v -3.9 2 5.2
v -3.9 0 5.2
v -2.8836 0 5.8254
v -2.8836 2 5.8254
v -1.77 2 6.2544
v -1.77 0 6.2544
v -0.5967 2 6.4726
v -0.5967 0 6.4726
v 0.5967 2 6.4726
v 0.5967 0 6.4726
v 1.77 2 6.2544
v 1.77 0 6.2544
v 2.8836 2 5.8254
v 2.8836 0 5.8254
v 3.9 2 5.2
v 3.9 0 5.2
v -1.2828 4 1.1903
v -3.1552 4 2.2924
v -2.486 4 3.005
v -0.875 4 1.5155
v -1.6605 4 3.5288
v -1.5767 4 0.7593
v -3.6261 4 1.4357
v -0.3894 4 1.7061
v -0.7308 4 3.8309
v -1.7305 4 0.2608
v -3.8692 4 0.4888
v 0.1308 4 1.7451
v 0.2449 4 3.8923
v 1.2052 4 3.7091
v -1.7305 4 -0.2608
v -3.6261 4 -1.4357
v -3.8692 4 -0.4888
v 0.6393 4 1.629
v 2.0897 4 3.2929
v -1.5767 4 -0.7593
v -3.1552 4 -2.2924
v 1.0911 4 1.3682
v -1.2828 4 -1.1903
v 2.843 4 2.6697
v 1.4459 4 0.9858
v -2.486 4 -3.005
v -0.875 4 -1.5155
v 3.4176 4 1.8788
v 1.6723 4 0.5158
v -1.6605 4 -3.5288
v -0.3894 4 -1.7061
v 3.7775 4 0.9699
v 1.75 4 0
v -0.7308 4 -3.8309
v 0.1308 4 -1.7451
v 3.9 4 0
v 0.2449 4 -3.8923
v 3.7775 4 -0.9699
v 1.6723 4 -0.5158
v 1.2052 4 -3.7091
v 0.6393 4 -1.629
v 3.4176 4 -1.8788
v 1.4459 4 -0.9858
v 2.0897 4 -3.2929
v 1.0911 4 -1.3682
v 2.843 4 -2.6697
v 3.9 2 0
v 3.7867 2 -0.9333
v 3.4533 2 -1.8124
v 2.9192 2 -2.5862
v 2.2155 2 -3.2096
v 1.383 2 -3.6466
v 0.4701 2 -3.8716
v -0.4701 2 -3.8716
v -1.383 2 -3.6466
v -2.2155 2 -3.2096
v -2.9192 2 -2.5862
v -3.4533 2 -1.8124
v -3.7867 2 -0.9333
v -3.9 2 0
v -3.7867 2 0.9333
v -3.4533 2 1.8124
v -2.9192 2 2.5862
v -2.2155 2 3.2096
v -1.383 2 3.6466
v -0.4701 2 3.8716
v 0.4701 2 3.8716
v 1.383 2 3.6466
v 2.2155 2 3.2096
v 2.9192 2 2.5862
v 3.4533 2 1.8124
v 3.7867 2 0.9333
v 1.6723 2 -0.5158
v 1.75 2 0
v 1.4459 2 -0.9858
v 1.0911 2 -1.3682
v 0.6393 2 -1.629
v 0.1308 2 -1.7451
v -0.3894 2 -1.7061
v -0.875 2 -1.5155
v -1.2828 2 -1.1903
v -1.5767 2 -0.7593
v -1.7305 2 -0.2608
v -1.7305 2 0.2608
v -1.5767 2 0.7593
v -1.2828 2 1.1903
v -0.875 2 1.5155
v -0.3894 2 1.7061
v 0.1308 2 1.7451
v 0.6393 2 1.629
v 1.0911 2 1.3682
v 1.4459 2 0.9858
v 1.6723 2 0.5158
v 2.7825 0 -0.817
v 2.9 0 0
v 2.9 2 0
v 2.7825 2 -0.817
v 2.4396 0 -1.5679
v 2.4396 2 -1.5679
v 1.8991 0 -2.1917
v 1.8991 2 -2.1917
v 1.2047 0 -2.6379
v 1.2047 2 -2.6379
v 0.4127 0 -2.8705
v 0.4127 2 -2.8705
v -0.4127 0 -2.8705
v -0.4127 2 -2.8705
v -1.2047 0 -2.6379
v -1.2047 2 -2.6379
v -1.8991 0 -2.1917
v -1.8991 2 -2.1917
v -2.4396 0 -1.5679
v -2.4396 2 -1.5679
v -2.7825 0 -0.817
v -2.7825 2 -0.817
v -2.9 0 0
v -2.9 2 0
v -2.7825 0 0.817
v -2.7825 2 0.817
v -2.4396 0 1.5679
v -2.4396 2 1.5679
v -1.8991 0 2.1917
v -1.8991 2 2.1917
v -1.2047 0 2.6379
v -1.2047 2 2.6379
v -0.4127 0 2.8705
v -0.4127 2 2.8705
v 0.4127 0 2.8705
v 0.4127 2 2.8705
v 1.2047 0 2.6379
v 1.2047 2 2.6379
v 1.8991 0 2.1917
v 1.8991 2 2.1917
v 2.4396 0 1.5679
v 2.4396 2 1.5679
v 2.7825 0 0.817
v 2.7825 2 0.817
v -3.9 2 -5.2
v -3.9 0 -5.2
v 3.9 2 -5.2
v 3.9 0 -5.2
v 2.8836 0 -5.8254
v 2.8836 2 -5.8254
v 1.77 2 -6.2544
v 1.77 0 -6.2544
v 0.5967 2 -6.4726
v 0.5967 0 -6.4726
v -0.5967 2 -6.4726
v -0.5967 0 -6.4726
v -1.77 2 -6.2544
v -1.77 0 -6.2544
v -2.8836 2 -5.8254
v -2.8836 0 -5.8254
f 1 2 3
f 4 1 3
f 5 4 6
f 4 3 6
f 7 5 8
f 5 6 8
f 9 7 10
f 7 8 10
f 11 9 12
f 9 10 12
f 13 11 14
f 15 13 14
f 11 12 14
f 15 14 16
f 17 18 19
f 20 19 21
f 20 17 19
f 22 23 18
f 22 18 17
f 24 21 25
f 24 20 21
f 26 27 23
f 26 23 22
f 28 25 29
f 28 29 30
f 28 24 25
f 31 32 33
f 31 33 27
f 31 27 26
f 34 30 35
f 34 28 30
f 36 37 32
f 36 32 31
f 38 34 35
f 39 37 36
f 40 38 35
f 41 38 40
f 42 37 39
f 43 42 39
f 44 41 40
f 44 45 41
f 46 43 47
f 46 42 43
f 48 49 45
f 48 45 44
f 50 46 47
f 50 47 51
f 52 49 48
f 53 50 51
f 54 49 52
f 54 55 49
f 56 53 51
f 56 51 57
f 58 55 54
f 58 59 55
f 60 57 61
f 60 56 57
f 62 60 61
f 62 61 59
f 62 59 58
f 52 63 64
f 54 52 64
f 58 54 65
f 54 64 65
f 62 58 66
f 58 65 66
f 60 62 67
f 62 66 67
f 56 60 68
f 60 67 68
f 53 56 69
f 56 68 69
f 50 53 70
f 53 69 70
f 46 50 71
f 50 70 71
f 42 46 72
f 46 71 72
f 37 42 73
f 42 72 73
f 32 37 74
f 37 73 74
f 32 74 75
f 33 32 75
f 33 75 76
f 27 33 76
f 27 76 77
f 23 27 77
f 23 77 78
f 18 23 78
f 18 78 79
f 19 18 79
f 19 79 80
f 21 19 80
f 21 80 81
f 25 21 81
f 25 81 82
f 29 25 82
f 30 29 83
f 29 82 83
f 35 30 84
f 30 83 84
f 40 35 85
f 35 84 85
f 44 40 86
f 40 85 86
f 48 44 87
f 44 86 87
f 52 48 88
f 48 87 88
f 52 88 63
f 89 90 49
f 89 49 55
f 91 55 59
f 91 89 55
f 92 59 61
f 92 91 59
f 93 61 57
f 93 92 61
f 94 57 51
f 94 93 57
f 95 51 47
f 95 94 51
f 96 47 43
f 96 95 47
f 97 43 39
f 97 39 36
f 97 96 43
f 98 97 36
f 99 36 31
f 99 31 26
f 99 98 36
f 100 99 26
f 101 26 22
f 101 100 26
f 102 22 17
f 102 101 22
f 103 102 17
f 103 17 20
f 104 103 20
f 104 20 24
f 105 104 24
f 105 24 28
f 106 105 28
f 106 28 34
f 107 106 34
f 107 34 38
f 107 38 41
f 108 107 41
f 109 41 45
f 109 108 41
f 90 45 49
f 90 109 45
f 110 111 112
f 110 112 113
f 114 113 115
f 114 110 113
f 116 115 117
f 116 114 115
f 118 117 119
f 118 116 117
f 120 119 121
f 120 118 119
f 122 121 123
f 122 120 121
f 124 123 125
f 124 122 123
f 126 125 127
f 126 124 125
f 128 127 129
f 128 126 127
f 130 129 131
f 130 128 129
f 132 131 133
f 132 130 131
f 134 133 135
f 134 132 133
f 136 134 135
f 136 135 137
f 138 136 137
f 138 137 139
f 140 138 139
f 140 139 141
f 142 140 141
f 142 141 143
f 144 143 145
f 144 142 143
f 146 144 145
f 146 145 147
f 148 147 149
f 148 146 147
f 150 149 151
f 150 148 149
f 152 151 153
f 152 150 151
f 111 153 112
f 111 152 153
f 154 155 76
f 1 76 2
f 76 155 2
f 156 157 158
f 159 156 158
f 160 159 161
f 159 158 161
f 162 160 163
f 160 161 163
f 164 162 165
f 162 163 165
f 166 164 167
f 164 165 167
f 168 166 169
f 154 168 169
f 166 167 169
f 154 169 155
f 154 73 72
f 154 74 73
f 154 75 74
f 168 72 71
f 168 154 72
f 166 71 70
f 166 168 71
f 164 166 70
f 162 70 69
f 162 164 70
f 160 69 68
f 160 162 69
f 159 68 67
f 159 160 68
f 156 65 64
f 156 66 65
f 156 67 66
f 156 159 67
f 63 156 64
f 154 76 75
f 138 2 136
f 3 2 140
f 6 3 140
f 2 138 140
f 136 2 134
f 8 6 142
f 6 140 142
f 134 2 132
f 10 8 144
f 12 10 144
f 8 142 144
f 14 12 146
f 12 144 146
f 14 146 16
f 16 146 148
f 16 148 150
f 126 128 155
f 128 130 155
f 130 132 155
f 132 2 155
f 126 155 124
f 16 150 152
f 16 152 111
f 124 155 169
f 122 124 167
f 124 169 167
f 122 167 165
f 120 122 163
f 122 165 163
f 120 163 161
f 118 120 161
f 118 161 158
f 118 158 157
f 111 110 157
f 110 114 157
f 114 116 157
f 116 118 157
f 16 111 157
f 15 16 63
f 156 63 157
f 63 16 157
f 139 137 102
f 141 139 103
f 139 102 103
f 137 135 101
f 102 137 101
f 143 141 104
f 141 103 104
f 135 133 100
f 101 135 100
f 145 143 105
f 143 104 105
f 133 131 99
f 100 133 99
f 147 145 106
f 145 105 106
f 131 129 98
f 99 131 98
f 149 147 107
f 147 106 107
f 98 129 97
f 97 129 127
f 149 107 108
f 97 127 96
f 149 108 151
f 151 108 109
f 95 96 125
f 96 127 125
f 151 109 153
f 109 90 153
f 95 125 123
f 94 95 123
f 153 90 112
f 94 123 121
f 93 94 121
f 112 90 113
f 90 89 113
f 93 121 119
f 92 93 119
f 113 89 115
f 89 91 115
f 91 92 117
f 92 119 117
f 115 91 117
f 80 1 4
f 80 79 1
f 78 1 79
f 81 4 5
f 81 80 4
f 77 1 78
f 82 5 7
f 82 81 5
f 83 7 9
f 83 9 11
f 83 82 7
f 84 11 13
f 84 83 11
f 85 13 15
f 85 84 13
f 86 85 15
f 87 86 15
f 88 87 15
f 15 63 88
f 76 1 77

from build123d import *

# Parameters (mm, degrees)
SKETCH2_R           = 2.9
BOSS_EXTRUDE1_DEPTH = 2
SKETCH3_R           = 3.9
SKETCH3_R_2         = 2.9
SKETCH3_R_3         = 1.75
BOSS_EXTRUDE2_DEPTH = 2


with BuildPart() as part:
    # Sketch2 → Boss-Extrude1 (new body)
    with BuildSketch(Plane(origin=(0, 0, 0), x_dir=(1, 0, 0), z_dir=(0, 1, 0))):
        with BuildLine():
            ThreePointArc((3.9, 5.2), (0, 6.5), (-3.9, 5.2))
            Line((-3.9, 5.2), (-3.9, -5.2))
            ThreePointArc((-3.9, -5.2), (0, -6.5), (3.9, -5.2))
            Line((3.9, -5.2), (3.9, 5.2))
        make_face()
        Circle(SKETCH2_R, mode=Mode.SUBTRACT)
    extrude(amount=BOSS_EXTRUDE1_DEPTH)

    # Sketch3 → Boss-Extrude2 (add)
    with BuildSketch(Plane(origin=(0, 2, 0), x_dir=(1, 0, 0), z_dir=(0, 1, 0))):
        Circle(SKETCH3_R)
        Circle(SKETCH3_R_2, mode=Mode.SUBTRACT)
        Circle(SKETCH3_R_2)
        Circle(SKETCH3_R_3, mode=Mode.SUBTRACT)
    extrude(amount=BOSS_EXTRUDE2_DEPTH)


solid = part.part
